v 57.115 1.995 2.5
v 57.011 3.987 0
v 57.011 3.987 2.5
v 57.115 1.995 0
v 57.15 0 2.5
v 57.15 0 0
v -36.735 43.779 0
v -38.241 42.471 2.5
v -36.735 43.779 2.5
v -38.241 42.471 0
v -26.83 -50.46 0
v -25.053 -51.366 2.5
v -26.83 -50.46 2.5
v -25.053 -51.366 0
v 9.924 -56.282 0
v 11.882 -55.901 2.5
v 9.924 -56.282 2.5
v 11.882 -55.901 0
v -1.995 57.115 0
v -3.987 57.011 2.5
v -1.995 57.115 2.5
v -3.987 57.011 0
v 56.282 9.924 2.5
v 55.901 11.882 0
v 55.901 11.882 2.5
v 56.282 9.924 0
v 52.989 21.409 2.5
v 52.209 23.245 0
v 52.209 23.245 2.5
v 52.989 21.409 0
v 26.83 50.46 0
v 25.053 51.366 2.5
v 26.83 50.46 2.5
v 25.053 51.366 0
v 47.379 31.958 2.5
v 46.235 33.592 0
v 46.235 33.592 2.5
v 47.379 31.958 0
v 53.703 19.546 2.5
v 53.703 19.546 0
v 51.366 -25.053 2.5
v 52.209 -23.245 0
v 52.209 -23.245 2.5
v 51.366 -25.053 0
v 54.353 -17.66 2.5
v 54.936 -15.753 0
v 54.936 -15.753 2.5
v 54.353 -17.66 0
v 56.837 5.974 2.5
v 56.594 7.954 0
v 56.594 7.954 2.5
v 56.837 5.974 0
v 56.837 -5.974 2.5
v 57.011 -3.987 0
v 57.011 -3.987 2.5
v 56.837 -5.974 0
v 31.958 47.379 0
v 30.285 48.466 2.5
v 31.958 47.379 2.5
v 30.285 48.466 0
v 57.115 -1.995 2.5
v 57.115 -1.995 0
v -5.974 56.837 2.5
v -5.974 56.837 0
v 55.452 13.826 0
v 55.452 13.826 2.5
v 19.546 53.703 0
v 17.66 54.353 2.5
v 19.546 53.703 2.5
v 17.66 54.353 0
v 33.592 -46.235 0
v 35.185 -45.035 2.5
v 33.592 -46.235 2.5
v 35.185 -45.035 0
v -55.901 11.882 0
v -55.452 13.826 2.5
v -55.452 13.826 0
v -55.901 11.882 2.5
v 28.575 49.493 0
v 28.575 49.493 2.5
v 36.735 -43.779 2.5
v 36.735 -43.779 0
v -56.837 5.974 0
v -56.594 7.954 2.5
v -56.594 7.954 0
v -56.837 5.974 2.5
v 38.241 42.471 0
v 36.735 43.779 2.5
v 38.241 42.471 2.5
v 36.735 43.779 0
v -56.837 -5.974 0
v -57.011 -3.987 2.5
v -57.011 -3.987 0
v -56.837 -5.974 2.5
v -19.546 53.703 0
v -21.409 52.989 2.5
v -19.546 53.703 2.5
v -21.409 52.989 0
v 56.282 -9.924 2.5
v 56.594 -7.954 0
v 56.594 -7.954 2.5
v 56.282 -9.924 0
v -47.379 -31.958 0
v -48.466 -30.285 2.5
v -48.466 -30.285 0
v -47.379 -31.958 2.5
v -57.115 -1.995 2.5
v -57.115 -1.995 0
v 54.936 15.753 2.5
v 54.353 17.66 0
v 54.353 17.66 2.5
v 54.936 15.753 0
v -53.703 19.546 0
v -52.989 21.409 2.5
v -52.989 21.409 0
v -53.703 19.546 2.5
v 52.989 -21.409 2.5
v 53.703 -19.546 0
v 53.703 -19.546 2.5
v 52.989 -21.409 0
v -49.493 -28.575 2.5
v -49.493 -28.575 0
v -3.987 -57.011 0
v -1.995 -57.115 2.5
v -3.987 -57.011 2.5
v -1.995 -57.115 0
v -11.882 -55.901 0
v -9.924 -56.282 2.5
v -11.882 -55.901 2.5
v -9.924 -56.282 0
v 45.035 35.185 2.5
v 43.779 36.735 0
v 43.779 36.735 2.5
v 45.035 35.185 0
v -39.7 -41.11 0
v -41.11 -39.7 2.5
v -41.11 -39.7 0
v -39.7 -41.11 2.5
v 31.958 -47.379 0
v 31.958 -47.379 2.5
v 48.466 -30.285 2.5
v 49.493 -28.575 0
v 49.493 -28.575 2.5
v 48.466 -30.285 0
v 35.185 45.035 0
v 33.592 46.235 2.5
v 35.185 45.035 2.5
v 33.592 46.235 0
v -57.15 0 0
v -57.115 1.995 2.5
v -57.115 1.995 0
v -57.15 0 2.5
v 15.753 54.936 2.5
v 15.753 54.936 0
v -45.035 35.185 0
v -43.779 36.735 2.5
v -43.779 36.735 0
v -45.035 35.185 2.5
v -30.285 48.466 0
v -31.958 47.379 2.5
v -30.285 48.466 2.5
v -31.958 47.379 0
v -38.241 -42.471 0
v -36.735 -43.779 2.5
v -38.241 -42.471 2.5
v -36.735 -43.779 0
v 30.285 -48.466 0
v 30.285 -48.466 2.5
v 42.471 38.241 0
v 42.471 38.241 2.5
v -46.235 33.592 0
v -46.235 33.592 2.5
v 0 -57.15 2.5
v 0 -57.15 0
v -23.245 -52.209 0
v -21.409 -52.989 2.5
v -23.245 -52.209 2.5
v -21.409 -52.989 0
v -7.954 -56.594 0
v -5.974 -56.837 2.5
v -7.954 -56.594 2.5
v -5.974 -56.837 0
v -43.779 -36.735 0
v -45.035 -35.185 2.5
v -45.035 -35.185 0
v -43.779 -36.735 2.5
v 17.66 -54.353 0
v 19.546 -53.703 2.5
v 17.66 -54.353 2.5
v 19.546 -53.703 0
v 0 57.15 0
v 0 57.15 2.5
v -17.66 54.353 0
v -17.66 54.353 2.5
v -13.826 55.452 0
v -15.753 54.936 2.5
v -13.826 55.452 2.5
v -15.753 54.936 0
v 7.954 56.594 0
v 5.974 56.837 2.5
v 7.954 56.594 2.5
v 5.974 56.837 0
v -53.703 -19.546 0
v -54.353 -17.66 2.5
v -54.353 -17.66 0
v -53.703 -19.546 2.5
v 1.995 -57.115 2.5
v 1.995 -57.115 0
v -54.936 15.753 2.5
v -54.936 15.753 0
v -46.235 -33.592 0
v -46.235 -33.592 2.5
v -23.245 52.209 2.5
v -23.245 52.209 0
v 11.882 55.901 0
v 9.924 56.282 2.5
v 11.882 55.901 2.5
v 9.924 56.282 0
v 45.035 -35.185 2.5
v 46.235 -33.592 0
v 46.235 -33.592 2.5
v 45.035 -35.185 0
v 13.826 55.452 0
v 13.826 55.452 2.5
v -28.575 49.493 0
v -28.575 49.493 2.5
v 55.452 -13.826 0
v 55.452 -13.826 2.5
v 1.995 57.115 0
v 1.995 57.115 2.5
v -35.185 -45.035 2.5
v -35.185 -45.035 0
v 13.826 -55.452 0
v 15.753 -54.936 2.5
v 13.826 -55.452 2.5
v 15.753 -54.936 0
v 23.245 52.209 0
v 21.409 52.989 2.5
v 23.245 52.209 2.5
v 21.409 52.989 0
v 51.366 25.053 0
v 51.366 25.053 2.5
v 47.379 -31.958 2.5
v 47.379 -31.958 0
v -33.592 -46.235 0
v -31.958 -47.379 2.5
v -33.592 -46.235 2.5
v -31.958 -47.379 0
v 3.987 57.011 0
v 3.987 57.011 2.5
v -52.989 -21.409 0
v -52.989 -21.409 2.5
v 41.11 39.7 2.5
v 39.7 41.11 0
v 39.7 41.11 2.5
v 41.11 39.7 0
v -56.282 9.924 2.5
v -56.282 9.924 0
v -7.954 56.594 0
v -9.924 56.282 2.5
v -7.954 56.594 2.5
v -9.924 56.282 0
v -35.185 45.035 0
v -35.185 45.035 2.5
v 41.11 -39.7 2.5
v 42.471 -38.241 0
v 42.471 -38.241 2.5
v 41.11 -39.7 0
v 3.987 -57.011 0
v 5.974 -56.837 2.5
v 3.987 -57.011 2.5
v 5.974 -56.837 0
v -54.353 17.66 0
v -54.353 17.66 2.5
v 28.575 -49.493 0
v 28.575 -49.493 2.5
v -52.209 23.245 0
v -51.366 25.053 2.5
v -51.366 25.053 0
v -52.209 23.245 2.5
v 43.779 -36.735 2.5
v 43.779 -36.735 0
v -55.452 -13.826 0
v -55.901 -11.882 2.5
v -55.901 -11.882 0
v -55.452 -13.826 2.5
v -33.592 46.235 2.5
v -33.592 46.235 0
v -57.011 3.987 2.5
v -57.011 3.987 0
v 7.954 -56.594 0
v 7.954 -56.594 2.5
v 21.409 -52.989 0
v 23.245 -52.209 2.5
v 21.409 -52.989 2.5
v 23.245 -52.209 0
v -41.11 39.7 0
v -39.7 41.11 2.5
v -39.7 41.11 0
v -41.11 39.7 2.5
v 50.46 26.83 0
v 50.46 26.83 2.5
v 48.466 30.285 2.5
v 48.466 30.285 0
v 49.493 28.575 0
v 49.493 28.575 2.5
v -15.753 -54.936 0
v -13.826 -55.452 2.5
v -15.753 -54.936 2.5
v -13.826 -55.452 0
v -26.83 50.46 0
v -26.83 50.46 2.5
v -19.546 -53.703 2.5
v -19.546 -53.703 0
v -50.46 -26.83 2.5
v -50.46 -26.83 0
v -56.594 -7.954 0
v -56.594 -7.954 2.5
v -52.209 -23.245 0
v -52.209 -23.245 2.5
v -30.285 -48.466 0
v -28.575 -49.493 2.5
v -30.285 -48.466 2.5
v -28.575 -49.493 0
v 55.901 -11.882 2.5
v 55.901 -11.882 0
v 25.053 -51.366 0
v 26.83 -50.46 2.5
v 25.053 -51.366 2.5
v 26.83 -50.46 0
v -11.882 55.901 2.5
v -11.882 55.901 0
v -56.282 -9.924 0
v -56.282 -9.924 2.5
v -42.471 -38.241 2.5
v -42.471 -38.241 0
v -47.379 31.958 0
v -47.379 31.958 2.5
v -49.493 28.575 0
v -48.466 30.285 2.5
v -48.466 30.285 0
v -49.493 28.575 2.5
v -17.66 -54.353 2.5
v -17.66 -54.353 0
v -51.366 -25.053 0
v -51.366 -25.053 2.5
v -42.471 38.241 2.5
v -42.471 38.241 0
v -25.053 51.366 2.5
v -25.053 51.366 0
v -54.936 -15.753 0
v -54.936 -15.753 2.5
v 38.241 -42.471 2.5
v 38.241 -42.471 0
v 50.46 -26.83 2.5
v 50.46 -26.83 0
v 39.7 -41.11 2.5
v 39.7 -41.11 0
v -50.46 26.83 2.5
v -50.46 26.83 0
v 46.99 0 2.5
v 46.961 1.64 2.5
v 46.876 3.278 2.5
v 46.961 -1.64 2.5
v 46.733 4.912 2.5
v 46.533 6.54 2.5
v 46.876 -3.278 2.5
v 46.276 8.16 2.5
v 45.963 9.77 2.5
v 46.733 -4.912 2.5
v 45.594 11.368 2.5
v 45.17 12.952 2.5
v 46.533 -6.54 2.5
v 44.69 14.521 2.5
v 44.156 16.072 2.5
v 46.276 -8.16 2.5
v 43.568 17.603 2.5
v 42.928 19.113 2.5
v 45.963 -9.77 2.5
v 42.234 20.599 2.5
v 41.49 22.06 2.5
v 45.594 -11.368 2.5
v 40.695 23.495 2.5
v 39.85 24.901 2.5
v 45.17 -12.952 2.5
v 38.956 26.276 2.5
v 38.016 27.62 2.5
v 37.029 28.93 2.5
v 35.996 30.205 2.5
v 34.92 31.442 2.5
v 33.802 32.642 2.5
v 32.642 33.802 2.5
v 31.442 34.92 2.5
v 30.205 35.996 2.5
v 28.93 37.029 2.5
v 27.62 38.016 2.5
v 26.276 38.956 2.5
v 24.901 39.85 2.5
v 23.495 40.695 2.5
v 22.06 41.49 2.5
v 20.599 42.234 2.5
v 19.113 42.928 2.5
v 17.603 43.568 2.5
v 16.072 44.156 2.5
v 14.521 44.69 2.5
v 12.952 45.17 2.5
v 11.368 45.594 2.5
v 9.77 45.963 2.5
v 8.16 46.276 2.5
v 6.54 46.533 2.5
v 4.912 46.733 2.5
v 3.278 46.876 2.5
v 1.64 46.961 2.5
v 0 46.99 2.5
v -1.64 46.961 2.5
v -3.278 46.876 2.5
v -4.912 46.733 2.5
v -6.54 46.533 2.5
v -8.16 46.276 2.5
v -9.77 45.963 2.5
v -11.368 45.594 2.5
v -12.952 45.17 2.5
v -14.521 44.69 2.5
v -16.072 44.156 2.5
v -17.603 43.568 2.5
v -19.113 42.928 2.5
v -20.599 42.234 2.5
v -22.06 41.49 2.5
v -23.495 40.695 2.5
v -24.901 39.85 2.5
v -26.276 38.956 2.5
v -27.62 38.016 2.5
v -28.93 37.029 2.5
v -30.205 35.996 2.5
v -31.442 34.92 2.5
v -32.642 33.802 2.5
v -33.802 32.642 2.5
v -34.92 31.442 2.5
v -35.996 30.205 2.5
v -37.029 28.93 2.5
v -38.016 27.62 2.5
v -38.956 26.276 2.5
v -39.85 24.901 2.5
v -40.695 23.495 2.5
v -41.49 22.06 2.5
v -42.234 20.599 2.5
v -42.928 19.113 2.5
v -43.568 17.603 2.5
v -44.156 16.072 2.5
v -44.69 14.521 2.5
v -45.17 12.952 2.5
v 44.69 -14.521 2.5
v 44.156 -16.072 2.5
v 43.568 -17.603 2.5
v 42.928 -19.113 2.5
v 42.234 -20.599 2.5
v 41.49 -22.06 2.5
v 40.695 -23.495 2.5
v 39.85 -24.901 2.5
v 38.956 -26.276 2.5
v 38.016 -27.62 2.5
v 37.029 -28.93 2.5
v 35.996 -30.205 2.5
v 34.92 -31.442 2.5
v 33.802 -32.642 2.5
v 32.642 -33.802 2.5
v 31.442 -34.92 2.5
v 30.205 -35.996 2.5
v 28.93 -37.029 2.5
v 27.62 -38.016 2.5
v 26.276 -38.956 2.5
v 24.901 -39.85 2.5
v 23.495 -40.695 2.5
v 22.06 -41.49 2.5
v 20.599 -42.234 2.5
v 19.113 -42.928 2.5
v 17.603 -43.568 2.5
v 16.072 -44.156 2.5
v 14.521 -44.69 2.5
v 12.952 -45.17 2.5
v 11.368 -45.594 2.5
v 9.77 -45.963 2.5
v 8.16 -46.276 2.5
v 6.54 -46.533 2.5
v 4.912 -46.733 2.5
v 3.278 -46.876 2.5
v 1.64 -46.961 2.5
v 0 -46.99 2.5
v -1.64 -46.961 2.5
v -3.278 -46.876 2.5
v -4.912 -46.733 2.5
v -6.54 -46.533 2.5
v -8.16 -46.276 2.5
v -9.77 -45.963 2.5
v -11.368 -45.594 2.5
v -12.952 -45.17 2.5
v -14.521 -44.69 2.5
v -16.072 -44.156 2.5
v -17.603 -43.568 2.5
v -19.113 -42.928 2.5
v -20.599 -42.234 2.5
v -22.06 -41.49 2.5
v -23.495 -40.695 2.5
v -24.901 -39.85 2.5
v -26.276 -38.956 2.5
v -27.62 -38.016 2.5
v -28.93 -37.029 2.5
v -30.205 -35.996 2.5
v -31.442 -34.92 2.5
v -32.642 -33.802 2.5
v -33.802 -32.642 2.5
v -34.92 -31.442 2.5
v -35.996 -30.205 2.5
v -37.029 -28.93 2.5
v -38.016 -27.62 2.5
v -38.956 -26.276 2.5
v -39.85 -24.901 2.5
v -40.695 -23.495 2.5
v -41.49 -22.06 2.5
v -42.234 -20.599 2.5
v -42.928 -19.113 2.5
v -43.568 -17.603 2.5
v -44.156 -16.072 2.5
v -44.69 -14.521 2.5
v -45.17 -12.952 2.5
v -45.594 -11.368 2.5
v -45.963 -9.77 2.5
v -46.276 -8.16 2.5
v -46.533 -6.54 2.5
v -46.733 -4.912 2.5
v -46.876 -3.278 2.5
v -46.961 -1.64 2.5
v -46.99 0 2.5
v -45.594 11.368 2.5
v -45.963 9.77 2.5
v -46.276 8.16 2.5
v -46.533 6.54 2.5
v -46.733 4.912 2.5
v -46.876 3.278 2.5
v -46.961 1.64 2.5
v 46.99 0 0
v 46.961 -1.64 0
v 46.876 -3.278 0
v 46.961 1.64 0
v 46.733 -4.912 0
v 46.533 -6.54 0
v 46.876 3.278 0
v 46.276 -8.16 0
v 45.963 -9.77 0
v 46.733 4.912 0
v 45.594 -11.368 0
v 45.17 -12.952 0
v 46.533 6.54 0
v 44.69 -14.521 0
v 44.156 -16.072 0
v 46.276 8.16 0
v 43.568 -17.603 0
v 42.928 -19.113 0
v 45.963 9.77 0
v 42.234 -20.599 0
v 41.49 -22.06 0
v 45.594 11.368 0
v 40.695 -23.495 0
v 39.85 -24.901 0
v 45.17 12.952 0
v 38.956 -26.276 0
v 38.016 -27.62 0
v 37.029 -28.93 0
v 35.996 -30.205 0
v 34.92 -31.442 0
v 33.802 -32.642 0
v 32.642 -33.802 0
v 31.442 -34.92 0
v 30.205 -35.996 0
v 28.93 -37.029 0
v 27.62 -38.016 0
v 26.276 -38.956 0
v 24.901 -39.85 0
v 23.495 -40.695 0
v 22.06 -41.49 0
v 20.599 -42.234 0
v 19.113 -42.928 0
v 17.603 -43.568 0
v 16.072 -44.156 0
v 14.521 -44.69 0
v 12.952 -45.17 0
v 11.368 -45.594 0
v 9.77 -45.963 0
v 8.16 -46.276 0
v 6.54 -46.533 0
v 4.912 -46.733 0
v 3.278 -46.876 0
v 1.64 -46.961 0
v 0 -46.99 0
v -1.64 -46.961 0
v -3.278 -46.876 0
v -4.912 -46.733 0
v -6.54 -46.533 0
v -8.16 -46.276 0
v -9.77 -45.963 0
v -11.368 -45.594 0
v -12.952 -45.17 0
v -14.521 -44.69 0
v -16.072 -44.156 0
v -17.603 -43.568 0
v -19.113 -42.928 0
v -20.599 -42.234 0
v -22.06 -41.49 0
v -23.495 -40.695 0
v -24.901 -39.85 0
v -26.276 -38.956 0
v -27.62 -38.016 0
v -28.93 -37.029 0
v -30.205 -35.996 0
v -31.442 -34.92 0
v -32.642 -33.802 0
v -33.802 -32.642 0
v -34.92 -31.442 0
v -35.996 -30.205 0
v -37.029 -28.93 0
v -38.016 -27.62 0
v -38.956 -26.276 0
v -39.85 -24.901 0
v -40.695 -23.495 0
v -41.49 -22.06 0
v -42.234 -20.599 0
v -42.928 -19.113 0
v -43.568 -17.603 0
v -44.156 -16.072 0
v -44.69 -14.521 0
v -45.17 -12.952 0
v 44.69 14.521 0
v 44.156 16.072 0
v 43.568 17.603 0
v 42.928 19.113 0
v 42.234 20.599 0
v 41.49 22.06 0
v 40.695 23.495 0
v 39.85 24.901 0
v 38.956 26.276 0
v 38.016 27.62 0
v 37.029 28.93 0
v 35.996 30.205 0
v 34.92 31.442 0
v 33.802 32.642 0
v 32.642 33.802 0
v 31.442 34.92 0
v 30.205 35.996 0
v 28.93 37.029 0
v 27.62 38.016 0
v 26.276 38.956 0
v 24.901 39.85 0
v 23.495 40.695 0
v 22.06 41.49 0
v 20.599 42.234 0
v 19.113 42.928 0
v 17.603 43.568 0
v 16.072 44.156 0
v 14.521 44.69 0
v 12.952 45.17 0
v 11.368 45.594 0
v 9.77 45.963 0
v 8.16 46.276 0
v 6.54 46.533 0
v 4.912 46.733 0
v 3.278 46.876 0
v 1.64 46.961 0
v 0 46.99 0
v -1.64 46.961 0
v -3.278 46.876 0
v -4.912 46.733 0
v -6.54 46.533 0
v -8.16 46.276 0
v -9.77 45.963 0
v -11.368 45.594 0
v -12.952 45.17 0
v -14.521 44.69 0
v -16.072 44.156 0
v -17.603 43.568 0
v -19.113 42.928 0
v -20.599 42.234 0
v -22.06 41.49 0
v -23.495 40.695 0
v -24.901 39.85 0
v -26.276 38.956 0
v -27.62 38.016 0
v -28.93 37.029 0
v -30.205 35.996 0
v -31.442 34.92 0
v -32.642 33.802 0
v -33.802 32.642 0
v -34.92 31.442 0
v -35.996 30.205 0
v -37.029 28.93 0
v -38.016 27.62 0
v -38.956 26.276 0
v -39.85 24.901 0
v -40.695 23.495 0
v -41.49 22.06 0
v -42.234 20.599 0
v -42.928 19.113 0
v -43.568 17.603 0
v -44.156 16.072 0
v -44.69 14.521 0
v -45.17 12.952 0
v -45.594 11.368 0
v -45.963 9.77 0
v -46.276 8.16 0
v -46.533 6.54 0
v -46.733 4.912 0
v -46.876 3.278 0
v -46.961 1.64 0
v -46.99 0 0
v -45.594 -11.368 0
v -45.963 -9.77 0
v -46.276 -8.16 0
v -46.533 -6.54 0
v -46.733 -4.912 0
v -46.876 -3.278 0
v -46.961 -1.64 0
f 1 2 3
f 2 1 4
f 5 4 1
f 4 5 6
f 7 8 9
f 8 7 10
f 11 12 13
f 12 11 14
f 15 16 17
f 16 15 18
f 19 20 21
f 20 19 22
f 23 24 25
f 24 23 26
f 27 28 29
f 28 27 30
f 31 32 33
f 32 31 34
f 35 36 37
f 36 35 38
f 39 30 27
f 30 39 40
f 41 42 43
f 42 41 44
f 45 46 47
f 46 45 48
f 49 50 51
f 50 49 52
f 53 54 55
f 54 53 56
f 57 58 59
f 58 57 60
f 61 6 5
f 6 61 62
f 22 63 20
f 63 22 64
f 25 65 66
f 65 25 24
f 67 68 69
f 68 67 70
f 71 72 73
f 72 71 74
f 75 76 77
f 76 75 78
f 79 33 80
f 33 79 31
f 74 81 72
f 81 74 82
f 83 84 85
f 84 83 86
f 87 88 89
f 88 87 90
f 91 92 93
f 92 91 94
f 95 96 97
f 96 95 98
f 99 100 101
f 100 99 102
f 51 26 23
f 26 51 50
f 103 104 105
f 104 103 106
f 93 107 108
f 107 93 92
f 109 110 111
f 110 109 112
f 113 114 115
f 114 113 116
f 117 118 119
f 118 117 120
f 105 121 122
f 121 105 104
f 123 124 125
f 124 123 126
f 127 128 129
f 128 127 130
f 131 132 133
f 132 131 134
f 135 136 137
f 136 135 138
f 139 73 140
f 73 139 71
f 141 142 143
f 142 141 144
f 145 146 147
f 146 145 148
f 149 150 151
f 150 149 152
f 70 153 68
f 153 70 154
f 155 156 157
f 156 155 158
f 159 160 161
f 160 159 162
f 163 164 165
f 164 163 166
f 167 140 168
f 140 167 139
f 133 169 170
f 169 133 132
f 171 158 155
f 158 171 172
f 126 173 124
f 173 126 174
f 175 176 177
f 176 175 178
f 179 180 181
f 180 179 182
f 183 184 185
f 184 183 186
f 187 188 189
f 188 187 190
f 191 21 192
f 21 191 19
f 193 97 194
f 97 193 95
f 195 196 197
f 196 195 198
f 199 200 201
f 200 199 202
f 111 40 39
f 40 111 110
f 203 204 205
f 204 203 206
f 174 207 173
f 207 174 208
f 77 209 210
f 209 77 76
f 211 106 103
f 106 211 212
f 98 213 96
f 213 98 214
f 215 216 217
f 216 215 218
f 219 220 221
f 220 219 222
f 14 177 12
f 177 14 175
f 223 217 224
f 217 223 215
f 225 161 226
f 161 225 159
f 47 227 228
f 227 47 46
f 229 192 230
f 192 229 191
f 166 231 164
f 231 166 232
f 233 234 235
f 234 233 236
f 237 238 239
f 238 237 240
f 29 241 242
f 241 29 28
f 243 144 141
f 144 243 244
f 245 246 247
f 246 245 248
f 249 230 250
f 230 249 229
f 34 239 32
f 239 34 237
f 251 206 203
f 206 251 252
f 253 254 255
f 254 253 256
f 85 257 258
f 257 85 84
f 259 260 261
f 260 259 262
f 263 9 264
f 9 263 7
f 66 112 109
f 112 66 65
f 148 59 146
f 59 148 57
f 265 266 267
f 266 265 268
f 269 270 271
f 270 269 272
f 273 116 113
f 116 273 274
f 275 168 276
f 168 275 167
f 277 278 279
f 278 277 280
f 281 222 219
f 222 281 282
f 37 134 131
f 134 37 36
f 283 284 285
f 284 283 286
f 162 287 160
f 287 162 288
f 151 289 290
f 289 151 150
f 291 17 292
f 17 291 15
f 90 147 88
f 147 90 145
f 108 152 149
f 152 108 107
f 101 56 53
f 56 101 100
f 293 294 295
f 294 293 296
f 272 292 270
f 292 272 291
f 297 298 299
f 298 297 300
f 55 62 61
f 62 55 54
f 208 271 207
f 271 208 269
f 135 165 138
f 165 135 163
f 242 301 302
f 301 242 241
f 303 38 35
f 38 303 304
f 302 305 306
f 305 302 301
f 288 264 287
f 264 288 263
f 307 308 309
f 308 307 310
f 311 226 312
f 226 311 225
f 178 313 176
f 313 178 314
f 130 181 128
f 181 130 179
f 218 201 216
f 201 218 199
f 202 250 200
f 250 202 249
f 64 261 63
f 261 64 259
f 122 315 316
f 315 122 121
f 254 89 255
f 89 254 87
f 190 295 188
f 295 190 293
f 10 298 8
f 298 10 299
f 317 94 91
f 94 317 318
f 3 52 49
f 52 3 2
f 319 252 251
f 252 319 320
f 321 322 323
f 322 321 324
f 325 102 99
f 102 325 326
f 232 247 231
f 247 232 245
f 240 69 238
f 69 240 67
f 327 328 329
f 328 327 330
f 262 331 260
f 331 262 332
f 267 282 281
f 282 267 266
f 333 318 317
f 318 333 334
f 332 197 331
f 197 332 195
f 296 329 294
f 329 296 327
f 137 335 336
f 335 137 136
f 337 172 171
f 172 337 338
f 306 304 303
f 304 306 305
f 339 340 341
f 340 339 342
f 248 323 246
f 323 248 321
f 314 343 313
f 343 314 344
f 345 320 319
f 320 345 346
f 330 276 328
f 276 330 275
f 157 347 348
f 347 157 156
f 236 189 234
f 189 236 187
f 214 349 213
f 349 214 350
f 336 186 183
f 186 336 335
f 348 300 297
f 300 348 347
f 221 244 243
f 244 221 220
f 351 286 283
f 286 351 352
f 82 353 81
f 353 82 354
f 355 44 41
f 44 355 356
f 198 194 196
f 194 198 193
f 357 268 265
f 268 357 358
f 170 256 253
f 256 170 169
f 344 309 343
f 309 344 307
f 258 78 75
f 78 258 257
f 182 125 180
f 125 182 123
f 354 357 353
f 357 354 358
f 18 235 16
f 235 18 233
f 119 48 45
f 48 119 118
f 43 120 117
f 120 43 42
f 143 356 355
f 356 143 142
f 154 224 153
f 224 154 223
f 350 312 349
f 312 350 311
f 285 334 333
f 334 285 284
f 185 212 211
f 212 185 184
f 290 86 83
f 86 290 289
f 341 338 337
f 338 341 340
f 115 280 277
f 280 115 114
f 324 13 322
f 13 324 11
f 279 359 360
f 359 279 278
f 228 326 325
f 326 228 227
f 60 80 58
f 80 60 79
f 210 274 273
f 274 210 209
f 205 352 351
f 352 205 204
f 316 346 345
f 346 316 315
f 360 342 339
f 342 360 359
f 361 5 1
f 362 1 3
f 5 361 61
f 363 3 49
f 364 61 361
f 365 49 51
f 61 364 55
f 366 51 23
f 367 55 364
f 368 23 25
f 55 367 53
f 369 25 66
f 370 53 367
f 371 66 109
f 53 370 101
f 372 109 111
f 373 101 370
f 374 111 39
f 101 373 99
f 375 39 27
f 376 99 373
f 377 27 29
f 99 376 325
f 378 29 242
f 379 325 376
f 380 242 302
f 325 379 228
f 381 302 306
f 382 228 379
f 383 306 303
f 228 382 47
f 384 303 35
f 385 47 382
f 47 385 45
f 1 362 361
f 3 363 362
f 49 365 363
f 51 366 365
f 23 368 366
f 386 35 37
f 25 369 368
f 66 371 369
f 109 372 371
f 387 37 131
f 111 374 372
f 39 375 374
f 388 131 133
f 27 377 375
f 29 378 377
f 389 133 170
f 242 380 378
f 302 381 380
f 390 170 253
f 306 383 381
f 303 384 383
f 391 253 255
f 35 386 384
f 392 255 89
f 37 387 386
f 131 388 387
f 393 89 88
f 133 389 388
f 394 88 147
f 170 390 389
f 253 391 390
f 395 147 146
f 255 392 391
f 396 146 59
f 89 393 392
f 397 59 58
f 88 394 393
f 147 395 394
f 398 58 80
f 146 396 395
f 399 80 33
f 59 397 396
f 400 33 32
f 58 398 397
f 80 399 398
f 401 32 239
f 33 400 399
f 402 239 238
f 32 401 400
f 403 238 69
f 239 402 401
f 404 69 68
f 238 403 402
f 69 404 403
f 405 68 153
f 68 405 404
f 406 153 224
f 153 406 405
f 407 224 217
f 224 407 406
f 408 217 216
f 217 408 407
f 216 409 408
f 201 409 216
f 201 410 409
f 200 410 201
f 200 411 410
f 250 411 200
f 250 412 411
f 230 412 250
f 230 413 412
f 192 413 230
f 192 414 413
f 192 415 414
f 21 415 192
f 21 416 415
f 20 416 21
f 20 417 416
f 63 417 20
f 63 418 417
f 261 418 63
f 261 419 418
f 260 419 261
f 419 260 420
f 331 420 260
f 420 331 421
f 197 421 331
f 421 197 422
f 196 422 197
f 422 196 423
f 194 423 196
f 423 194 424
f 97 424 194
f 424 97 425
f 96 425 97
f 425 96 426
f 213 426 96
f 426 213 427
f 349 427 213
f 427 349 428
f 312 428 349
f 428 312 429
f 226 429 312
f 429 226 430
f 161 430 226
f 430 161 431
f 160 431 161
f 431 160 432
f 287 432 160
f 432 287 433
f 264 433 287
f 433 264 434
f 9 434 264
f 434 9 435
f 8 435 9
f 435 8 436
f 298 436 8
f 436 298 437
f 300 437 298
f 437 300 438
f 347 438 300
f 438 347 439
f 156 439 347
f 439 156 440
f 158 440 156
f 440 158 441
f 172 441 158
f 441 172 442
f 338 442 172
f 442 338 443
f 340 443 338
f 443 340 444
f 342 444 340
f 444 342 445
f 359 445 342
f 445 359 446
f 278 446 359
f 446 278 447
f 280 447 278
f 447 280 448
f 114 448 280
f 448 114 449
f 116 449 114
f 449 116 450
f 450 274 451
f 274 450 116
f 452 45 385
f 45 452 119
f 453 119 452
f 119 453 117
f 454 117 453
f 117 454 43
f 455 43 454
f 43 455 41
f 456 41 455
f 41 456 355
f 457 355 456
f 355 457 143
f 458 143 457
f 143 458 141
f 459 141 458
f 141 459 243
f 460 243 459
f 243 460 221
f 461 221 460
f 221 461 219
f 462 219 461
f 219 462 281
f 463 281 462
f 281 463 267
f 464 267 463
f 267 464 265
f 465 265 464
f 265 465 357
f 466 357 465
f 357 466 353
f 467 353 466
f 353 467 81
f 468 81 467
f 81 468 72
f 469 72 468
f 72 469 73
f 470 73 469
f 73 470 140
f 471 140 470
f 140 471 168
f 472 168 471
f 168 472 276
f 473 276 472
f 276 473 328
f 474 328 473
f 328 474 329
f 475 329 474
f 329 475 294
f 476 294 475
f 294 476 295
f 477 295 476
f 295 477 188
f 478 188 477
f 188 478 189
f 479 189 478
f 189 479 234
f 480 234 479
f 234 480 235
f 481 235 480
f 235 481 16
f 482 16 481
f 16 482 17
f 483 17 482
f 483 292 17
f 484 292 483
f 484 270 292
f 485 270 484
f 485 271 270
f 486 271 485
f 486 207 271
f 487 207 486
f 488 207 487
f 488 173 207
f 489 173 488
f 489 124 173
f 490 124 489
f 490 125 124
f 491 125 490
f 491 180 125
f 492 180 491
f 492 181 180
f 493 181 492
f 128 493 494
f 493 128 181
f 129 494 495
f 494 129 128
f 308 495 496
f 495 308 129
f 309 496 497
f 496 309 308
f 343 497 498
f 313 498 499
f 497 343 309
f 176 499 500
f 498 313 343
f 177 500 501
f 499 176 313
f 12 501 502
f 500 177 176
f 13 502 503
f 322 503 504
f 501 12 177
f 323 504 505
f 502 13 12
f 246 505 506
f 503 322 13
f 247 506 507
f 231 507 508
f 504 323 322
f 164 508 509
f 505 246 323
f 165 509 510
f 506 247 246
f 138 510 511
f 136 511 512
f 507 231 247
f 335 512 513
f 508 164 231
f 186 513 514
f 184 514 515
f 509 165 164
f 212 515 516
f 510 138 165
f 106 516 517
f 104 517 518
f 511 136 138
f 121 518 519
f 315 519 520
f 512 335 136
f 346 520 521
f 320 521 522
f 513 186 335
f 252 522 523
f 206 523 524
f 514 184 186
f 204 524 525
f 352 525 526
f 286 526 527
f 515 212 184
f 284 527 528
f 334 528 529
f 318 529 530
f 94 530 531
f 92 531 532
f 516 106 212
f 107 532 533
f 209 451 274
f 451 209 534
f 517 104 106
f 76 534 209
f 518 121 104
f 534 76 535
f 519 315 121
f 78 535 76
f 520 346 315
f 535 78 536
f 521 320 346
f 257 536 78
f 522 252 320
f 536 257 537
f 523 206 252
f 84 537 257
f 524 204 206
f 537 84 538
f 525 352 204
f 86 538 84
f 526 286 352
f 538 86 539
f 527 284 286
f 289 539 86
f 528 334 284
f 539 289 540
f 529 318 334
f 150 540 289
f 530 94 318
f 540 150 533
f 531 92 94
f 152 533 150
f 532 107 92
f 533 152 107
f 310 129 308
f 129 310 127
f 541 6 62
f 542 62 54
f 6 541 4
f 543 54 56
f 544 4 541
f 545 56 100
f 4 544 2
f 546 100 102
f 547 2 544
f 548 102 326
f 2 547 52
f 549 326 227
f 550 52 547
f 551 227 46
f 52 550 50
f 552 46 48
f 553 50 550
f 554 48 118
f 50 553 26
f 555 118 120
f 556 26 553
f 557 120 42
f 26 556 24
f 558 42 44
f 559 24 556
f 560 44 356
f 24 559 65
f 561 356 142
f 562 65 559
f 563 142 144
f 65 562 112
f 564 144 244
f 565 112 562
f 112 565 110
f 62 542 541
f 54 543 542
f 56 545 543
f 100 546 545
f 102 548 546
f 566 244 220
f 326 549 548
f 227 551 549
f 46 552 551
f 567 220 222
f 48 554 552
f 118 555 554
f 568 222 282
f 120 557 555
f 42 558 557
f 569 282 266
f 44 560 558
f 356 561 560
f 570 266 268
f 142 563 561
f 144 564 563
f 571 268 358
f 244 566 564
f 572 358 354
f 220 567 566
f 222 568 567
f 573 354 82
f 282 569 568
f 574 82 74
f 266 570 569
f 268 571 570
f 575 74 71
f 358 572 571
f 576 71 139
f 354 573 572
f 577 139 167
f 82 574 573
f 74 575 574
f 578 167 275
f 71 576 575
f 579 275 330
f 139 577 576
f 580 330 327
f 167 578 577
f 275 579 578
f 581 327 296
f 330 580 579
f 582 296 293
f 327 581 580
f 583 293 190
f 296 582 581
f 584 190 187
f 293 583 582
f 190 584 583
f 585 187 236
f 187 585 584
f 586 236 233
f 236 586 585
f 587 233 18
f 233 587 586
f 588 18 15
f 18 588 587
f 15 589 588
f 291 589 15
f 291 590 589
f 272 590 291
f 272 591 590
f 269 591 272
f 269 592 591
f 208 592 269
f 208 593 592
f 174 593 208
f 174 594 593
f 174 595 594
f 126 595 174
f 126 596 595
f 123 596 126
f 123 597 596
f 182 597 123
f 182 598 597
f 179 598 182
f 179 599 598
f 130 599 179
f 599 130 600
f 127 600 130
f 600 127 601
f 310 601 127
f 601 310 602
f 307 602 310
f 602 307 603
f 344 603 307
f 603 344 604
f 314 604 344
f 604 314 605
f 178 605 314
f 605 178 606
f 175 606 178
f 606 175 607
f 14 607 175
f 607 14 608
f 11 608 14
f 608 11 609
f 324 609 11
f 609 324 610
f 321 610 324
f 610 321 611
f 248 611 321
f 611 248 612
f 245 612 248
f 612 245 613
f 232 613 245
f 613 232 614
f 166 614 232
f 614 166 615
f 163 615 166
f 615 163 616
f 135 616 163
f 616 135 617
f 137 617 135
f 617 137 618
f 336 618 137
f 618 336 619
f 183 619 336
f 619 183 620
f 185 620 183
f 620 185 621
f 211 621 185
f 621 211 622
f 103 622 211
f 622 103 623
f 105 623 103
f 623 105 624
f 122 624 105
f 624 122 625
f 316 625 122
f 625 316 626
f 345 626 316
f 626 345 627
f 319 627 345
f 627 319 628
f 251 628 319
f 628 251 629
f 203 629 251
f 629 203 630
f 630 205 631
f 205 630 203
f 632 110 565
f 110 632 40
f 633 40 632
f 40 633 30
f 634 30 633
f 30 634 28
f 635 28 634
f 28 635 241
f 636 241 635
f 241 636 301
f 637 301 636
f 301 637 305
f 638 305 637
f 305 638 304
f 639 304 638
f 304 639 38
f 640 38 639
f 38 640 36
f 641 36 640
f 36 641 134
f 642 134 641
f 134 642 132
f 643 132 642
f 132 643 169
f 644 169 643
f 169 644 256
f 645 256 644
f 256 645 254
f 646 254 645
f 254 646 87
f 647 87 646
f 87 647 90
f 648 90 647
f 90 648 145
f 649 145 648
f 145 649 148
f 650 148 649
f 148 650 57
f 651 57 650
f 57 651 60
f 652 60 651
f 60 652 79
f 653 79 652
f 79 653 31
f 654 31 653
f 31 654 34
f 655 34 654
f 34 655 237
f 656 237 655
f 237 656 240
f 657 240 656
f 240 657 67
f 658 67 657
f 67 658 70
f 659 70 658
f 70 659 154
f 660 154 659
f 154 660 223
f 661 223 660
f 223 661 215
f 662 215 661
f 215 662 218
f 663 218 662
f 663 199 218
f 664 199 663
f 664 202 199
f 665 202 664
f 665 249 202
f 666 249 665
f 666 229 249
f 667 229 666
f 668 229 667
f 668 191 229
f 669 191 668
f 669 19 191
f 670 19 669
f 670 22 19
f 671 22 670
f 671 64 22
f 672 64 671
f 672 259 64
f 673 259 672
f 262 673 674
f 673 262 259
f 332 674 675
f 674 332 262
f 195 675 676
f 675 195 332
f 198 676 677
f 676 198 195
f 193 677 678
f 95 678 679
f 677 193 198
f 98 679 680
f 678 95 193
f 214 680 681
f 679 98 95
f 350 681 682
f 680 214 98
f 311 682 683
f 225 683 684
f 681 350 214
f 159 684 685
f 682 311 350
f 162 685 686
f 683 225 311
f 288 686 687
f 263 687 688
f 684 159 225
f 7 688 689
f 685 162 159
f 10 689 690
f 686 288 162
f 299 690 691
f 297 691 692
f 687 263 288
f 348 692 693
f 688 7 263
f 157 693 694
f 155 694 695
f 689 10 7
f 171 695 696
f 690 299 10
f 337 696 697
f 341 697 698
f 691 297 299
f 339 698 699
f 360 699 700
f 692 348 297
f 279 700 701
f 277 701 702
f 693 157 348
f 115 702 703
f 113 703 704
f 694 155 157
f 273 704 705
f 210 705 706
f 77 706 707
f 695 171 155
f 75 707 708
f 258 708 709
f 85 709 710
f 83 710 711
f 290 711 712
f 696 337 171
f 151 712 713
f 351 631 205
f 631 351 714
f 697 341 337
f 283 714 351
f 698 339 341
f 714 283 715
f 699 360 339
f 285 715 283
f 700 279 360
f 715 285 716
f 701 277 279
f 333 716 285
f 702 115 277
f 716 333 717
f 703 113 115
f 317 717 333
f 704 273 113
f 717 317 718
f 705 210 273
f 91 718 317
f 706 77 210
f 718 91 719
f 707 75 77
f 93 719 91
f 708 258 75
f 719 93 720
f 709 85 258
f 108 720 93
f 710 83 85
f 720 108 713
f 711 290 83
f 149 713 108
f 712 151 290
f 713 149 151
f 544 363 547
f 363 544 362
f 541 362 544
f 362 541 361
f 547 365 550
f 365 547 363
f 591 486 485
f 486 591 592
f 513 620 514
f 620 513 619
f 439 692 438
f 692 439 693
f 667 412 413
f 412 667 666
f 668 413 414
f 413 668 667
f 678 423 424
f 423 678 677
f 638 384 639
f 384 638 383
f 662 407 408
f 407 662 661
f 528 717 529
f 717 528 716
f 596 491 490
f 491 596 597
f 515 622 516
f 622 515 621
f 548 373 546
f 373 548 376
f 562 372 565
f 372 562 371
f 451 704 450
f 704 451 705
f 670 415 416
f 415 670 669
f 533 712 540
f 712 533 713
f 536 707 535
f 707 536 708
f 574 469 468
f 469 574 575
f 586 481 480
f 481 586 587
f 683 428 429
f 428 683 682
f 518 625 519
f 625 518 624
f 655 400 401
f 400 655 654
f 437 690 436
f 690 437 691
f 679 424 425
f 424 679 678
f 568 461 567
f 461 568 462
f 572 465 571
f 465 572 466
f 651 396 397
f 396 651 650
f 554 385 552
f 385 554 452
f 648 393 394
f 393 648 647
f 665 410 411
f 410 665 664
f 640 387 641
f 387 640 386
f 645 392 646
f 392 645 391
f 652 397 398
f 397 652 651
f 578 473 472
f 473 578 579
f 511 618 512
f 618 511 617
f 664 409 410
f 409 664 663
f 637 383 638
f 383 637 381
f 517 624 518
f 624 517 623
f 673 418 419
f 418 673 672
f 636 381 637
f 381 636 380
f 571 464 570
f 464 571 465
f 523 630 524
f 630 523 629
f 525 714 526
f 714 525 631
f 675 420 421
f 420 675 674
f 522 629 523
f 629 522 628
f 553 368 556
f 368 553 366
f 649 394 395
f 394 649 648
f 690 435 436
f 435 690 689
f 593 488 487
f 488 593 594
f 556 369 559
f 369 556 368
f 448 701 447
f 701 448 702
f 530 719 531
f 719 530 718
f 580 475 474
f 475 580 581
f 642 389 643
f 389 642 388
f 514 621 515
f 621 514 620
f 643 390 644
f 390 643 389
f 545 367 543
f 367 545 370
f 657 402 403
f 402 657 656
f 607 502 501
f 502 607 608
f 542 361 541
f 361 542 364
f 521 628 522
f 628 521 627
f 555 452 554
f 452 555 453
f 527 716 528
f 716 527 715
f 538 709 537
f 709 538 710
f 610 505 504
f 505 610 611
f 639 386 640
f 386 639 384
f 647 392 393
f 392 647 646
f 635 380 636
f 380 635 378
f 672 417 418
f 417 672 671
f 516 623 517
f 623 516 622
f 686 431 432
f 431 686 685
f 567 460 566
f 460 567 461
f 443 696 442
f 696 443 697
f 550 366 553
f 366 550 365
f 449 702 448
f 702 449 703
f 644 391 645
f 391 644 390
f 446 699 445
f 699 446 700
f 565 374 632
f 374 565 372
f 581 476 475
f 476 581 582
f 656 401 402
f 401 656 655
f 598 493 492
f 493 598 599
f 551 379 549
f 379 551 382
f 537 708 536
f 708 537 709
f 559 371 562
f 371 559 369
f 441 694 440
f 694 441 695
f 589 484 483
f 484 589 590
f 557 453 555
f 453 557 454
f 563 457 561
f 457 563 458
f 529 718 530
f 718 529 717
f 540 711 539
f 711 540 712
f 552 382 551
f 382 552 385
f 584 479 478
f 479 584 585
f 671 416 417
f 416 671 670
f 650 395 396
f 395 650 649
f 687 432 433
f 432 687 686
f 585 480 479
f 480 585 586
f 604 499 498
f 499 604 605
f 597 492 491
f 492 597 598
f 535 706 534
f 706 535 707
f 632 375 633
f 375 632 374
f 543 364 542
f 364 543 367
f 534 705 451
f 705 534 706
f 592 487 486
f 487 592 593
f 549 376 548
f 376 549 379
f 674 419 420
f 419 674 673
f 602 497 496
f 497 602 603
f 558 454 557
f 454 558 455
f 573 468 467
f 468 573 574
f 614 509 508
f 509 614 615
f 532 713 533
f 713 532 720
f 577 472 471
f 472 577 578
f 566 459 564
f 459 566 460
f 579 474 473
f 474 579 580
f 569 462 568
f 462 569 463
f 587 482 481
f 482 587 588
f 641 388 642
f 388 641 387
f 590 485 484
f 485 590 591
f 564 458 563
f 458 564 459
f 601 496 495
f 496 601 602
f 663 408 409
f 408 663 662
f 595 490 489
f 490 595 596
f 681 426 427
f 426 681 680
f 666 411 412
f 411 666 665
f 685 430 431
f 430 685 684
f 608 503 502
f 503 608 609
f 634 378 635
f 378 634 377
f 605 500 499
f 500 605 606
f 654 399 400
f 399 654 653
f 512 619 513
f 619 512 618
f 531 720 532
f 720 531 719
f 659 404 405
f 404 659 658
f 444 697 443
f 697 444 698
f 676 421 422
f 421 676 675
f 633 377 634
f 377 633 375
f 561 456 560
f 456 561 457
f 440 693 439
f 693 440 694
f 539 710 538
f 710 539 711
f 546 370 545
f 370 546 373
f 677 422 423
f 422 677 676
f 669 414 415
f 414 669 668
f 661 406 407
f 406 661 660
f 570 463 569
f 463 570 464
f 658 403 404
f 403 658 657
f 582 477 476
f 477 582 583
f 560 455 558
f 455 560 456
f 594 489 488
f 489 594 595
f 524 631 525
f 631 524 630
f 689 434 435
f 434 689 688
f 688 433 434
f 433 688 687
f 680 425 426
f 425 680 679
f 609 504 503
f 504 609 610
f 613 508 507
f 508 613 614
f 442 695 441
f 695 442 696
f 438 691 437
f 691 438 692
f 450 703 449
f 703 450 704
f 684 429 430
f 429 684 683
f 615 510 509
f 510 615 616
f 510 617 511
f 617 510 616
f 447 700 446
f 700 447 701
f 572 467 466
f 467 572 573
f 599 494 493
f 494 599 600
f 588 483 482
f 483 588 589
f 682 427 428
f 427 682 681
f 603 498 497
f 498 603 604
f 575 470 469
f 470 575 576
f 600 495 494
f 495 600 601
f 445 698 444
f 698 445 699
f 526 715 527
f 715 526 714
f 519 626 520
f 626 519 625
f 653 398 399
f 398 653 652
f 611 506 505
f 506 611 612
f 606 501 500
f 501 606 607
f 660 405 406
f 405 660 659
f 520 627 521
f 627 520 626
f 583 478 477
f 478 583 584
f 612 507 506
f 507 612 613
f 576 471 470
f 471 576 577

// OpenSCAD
// Round flowerpot adapter plate for the playhouse front holder.
// Units: millimeters. Dimensions are kept in inches/centimeters at the top for tuning.

$fn = 180;

inch = 25.4;
cm = 10;

inner_radius = 3.7 * inch / 2;
outer_radius = 4.5 * inch / 2;
plate_thickness = 0.25 * cm;
cutout_overlap = 0.5;

assert(inner_radius > 0, "Inner radius must be positive.");
assert(outer_radius > inner_radius, "Outer radius must be larger than inner radius.");
assert(plate_thickness > 0, "Plate thickness must be positive.");

module adapter_plate() {
    difference() {
        cylinder(h = plate_thickness, r = outer_radius);
        translate([0, 0, -cutout_overlap])
            cylinder(h = plate_thickness + 2 * cutout_overlap, r = inner_radius);
    }
}

adapter_plate();
